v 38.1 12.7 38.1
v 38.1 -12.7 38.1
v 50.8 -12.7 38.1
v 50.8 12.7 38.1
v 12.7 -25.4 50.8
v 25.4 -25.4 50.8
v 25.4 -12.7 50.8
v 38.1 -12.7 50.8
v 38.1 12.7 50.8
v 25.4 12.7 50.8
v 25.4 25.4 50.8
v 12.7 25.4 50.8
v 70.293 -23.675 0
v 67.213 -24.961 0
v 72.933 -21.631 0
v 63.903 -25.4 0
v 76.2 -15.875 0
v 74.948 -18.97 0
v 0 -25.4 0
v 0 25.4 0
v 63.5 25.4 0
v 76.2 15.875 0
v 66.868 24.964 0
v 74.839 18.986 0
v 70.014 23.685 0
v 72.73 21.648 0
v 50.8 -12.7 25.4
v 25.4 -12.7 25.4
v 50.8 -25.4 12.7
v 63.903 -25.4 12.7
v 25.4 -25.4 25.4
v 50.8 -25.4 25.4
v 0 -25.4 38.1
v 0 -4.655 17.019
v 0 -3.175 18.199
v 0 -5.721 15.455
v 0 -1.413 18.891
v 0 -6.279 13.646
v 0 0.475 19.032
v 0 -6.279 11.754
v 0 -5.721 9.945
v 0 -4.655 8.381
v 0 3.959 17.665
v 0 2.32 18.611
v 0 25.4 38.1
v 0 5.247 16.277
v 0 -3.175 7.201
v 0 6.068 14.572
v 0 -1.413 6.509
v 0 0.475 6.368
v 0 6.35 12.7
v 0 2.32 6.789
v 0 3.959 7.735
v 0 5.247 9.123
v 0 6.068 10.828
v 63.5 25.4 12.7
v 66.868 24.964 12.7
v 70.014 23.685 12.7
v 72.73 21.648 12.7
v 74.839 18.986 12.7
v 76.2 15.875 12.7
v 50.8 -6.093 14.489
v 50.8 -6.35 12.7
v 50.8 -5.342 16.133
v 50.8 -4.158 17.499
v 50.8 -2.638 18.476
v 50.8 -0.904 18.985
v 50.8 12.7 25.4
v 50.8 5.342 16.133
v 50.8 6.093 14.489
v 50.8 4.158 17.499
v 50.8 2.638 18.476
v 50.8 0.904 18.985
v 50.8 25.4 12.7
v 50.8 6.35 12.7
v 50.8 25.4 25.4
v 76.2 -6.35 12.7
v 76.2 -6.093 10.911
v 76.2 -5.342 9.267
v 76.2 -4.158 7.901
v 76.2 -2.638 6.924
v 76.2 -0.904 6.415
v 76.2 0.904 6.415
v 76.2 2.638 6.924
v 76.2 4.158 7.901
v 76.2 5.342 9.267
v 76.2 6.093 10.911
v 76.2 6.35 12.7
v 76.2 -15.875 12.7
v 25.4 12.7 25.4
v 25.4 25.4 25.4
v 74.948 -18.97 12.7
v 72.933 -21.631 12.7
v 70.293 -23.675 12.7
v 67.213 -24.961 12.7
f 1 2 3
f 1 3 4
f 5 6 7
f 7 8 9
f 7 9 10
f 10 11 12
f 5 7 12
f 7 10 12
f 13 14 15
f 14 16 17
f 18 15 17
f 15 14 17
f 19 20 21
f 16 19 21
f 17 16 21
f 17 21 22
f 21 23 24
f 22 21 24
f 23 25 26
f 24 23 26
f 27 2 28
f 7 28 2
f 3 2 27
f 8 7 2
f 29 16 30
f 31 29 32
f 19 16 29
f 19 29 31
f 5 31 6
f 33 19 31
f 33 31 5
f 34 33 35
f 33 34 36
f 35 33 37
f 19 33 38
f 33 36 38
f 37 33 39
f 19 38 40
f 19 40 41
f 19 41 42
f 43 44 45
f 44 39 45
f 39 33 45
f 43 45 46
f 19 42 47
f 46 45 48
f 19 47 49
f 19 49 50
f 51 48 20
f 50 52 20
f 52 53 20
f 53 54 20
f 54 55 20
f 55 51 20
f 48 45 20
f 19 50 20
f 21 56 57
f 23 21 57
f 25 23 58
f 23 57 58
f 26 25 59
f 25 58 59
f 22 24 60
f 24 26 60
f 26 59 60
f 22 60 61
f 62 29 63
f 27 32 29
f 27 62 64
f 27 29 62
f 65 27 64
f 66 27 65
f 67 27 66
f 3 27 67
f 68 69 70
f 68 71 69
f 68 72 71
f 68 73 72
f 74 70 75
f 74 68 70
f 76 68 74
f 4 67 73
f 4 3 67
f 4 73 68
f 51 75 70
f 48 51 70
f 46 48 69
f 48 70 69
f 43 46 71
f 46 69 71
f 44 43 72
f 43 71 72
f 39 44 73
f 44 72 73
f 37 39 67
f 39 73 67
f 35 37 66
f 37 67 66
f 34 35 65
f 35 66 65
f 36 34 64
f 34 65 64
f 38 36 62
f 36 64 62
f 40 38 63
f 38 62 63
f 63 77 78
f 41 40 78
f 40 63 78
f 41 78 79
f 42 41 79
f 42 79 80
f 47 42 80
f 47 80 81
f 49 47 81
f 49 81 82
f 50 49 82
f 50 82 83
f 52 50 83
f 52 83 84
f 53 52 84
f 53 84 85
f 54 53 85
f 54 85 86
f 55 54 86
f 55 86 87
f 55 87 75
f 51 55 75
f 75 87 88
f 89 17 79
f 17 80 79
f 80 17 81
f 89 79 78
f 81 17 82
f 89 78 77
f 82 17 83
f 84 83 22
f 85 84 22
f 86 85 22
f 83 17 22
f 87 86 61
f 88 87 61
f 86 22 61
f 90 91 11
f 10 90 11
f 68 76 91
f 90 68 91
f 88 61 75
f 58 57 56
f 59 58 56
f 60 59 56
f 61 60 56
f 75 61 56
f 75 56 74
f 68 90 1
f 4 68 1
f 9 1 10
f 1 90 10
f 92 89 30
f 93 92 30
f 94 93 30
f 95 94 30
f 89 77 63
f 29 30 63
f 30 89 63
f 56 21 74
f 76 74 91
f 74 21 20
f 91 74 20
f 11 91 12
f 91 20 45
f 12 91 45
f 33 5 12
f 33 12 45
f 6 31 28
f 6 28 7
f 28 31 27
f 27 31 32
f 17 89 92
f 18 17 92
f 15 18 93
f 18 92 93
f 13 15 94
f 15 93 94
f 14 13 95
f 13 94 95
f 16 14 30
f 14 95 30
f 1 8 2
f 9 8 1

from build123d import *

# Parameters (mm, degrees)
F1_DEPTH      = 25.4
F1_DEPTH_BACK = 25.4
F2_W          = 25.4
F2_H          = 12.7
F3_DEPTH      = 12.7
F4_W          = 50.8
F4_H          = 12.7
F5_DEPTH      = 25.4
F6_W          = 25.4
F6_H          = 12.7
F7_DEPTH      = 12.7
F8_W          = 25.4
F8_H          = 12.7
F9_DEPTH      = 12.7
F10_R         = 6.35
F11_DEPTH     = 76.201
F13_DEPTH     = 12.701
F15_DEPTH     = 12.701


with BuildPart() as f1:
    # F0 (on Front) → F1 (new body, two sides)
    with BuildSketch(Plane.XZ) as f1_sk:
        Polygon((0, 38.1), (0, 0), (76.2, 0), (76.2, 12.7), (50.8, 12.7), (50.8, 25.4), (25.4, 25.4), (25.4, 50.8), (12.7, 50.8), align=None)
    extrude(amount=-F1_DEPTH)
    extrude(f1_sk.sketch, amount=F1_DEPTH_BACK)

    # F2 (on face) → F3 (join)
    with BuildSketch(Plane.YZ.offset(25.4)):
        with Locations((0, 44.45)):
            Rectangle(F2_W, F2_H)
    extrude(amount=F3_DEPTH)

    # F4 (on face) → F5 (join)
    with BuildSketch(Plane.YZ.offset(25.4)):
        with Locations((0, 31.75)):
            Rectangle(F4_W, F4_H)
    extrude(amount=F5_DEPTH)

    # F6 (on face) → F7 (cut)
    with BuildSketch(Plane.XZ.offset(25.4)):
        with Locations((38.1, 31.75)):
            Rectangle(F6_W, F6_H)
    extrude(amount=-F7_DEPTH, mode=Mode.SUBTRACT)

    # F8 (on face) → F9 (cut)
    with BuildSketch(Plane(origin=(0, 25.4, 0), x_dir=(-1, 0, 0), z_dir=(0, 1, 0))):
        with Locations((-38.1, 31.75)):
            Rectangle(F8_W, F8_H)
    extrude(amount=-F9_DEPTH, mode=Mode.SUBTRACT)

    # F10 (on face) → F11 (cut, through all)
    with BuildSketch(Plane.YZ.offset(76.2)):
        with Locations((0, 12.7)):
            Circle(F10_R)
    extrude(amount=-F11_DEPTH, mode=Mode.SUBTRACT)

    # F12 (on face) → F13 (cut, through all)
    with BuildSketch(Plane.XY.offset(12.7)):
        with BuildLine():
            Line((76.2, -25.4), (76.2, -15.875))
            ThreePointArc((76.2, -15.875), (71.6804078091, -22.740231571), (63.9032778758, -25.4))
            Line((63.9032778758, -25.4), (76.2, -25.4))
        make_face()
    extrude(amount=-F13_DEPTH, mode=Mode.SUBTRACT)

    # F14 (on face) → F15 (cut, through all)
    with BuildSketch(Plane.XY.offset(12.7)):
        with BuildLine():
            ThreePointArc((63.5, 25.4), (71.4375, 22.7541666667), (76.2, 15.875))
            Line((76.2, 15.875), (76.2, 25.4))
            Line((76.2, 25.4), (63.5, 25.4))
        make_face()
    extrude(amount=-F15_DEPTH, mode=Mode.SUBTRACT)


solid = f1.part
